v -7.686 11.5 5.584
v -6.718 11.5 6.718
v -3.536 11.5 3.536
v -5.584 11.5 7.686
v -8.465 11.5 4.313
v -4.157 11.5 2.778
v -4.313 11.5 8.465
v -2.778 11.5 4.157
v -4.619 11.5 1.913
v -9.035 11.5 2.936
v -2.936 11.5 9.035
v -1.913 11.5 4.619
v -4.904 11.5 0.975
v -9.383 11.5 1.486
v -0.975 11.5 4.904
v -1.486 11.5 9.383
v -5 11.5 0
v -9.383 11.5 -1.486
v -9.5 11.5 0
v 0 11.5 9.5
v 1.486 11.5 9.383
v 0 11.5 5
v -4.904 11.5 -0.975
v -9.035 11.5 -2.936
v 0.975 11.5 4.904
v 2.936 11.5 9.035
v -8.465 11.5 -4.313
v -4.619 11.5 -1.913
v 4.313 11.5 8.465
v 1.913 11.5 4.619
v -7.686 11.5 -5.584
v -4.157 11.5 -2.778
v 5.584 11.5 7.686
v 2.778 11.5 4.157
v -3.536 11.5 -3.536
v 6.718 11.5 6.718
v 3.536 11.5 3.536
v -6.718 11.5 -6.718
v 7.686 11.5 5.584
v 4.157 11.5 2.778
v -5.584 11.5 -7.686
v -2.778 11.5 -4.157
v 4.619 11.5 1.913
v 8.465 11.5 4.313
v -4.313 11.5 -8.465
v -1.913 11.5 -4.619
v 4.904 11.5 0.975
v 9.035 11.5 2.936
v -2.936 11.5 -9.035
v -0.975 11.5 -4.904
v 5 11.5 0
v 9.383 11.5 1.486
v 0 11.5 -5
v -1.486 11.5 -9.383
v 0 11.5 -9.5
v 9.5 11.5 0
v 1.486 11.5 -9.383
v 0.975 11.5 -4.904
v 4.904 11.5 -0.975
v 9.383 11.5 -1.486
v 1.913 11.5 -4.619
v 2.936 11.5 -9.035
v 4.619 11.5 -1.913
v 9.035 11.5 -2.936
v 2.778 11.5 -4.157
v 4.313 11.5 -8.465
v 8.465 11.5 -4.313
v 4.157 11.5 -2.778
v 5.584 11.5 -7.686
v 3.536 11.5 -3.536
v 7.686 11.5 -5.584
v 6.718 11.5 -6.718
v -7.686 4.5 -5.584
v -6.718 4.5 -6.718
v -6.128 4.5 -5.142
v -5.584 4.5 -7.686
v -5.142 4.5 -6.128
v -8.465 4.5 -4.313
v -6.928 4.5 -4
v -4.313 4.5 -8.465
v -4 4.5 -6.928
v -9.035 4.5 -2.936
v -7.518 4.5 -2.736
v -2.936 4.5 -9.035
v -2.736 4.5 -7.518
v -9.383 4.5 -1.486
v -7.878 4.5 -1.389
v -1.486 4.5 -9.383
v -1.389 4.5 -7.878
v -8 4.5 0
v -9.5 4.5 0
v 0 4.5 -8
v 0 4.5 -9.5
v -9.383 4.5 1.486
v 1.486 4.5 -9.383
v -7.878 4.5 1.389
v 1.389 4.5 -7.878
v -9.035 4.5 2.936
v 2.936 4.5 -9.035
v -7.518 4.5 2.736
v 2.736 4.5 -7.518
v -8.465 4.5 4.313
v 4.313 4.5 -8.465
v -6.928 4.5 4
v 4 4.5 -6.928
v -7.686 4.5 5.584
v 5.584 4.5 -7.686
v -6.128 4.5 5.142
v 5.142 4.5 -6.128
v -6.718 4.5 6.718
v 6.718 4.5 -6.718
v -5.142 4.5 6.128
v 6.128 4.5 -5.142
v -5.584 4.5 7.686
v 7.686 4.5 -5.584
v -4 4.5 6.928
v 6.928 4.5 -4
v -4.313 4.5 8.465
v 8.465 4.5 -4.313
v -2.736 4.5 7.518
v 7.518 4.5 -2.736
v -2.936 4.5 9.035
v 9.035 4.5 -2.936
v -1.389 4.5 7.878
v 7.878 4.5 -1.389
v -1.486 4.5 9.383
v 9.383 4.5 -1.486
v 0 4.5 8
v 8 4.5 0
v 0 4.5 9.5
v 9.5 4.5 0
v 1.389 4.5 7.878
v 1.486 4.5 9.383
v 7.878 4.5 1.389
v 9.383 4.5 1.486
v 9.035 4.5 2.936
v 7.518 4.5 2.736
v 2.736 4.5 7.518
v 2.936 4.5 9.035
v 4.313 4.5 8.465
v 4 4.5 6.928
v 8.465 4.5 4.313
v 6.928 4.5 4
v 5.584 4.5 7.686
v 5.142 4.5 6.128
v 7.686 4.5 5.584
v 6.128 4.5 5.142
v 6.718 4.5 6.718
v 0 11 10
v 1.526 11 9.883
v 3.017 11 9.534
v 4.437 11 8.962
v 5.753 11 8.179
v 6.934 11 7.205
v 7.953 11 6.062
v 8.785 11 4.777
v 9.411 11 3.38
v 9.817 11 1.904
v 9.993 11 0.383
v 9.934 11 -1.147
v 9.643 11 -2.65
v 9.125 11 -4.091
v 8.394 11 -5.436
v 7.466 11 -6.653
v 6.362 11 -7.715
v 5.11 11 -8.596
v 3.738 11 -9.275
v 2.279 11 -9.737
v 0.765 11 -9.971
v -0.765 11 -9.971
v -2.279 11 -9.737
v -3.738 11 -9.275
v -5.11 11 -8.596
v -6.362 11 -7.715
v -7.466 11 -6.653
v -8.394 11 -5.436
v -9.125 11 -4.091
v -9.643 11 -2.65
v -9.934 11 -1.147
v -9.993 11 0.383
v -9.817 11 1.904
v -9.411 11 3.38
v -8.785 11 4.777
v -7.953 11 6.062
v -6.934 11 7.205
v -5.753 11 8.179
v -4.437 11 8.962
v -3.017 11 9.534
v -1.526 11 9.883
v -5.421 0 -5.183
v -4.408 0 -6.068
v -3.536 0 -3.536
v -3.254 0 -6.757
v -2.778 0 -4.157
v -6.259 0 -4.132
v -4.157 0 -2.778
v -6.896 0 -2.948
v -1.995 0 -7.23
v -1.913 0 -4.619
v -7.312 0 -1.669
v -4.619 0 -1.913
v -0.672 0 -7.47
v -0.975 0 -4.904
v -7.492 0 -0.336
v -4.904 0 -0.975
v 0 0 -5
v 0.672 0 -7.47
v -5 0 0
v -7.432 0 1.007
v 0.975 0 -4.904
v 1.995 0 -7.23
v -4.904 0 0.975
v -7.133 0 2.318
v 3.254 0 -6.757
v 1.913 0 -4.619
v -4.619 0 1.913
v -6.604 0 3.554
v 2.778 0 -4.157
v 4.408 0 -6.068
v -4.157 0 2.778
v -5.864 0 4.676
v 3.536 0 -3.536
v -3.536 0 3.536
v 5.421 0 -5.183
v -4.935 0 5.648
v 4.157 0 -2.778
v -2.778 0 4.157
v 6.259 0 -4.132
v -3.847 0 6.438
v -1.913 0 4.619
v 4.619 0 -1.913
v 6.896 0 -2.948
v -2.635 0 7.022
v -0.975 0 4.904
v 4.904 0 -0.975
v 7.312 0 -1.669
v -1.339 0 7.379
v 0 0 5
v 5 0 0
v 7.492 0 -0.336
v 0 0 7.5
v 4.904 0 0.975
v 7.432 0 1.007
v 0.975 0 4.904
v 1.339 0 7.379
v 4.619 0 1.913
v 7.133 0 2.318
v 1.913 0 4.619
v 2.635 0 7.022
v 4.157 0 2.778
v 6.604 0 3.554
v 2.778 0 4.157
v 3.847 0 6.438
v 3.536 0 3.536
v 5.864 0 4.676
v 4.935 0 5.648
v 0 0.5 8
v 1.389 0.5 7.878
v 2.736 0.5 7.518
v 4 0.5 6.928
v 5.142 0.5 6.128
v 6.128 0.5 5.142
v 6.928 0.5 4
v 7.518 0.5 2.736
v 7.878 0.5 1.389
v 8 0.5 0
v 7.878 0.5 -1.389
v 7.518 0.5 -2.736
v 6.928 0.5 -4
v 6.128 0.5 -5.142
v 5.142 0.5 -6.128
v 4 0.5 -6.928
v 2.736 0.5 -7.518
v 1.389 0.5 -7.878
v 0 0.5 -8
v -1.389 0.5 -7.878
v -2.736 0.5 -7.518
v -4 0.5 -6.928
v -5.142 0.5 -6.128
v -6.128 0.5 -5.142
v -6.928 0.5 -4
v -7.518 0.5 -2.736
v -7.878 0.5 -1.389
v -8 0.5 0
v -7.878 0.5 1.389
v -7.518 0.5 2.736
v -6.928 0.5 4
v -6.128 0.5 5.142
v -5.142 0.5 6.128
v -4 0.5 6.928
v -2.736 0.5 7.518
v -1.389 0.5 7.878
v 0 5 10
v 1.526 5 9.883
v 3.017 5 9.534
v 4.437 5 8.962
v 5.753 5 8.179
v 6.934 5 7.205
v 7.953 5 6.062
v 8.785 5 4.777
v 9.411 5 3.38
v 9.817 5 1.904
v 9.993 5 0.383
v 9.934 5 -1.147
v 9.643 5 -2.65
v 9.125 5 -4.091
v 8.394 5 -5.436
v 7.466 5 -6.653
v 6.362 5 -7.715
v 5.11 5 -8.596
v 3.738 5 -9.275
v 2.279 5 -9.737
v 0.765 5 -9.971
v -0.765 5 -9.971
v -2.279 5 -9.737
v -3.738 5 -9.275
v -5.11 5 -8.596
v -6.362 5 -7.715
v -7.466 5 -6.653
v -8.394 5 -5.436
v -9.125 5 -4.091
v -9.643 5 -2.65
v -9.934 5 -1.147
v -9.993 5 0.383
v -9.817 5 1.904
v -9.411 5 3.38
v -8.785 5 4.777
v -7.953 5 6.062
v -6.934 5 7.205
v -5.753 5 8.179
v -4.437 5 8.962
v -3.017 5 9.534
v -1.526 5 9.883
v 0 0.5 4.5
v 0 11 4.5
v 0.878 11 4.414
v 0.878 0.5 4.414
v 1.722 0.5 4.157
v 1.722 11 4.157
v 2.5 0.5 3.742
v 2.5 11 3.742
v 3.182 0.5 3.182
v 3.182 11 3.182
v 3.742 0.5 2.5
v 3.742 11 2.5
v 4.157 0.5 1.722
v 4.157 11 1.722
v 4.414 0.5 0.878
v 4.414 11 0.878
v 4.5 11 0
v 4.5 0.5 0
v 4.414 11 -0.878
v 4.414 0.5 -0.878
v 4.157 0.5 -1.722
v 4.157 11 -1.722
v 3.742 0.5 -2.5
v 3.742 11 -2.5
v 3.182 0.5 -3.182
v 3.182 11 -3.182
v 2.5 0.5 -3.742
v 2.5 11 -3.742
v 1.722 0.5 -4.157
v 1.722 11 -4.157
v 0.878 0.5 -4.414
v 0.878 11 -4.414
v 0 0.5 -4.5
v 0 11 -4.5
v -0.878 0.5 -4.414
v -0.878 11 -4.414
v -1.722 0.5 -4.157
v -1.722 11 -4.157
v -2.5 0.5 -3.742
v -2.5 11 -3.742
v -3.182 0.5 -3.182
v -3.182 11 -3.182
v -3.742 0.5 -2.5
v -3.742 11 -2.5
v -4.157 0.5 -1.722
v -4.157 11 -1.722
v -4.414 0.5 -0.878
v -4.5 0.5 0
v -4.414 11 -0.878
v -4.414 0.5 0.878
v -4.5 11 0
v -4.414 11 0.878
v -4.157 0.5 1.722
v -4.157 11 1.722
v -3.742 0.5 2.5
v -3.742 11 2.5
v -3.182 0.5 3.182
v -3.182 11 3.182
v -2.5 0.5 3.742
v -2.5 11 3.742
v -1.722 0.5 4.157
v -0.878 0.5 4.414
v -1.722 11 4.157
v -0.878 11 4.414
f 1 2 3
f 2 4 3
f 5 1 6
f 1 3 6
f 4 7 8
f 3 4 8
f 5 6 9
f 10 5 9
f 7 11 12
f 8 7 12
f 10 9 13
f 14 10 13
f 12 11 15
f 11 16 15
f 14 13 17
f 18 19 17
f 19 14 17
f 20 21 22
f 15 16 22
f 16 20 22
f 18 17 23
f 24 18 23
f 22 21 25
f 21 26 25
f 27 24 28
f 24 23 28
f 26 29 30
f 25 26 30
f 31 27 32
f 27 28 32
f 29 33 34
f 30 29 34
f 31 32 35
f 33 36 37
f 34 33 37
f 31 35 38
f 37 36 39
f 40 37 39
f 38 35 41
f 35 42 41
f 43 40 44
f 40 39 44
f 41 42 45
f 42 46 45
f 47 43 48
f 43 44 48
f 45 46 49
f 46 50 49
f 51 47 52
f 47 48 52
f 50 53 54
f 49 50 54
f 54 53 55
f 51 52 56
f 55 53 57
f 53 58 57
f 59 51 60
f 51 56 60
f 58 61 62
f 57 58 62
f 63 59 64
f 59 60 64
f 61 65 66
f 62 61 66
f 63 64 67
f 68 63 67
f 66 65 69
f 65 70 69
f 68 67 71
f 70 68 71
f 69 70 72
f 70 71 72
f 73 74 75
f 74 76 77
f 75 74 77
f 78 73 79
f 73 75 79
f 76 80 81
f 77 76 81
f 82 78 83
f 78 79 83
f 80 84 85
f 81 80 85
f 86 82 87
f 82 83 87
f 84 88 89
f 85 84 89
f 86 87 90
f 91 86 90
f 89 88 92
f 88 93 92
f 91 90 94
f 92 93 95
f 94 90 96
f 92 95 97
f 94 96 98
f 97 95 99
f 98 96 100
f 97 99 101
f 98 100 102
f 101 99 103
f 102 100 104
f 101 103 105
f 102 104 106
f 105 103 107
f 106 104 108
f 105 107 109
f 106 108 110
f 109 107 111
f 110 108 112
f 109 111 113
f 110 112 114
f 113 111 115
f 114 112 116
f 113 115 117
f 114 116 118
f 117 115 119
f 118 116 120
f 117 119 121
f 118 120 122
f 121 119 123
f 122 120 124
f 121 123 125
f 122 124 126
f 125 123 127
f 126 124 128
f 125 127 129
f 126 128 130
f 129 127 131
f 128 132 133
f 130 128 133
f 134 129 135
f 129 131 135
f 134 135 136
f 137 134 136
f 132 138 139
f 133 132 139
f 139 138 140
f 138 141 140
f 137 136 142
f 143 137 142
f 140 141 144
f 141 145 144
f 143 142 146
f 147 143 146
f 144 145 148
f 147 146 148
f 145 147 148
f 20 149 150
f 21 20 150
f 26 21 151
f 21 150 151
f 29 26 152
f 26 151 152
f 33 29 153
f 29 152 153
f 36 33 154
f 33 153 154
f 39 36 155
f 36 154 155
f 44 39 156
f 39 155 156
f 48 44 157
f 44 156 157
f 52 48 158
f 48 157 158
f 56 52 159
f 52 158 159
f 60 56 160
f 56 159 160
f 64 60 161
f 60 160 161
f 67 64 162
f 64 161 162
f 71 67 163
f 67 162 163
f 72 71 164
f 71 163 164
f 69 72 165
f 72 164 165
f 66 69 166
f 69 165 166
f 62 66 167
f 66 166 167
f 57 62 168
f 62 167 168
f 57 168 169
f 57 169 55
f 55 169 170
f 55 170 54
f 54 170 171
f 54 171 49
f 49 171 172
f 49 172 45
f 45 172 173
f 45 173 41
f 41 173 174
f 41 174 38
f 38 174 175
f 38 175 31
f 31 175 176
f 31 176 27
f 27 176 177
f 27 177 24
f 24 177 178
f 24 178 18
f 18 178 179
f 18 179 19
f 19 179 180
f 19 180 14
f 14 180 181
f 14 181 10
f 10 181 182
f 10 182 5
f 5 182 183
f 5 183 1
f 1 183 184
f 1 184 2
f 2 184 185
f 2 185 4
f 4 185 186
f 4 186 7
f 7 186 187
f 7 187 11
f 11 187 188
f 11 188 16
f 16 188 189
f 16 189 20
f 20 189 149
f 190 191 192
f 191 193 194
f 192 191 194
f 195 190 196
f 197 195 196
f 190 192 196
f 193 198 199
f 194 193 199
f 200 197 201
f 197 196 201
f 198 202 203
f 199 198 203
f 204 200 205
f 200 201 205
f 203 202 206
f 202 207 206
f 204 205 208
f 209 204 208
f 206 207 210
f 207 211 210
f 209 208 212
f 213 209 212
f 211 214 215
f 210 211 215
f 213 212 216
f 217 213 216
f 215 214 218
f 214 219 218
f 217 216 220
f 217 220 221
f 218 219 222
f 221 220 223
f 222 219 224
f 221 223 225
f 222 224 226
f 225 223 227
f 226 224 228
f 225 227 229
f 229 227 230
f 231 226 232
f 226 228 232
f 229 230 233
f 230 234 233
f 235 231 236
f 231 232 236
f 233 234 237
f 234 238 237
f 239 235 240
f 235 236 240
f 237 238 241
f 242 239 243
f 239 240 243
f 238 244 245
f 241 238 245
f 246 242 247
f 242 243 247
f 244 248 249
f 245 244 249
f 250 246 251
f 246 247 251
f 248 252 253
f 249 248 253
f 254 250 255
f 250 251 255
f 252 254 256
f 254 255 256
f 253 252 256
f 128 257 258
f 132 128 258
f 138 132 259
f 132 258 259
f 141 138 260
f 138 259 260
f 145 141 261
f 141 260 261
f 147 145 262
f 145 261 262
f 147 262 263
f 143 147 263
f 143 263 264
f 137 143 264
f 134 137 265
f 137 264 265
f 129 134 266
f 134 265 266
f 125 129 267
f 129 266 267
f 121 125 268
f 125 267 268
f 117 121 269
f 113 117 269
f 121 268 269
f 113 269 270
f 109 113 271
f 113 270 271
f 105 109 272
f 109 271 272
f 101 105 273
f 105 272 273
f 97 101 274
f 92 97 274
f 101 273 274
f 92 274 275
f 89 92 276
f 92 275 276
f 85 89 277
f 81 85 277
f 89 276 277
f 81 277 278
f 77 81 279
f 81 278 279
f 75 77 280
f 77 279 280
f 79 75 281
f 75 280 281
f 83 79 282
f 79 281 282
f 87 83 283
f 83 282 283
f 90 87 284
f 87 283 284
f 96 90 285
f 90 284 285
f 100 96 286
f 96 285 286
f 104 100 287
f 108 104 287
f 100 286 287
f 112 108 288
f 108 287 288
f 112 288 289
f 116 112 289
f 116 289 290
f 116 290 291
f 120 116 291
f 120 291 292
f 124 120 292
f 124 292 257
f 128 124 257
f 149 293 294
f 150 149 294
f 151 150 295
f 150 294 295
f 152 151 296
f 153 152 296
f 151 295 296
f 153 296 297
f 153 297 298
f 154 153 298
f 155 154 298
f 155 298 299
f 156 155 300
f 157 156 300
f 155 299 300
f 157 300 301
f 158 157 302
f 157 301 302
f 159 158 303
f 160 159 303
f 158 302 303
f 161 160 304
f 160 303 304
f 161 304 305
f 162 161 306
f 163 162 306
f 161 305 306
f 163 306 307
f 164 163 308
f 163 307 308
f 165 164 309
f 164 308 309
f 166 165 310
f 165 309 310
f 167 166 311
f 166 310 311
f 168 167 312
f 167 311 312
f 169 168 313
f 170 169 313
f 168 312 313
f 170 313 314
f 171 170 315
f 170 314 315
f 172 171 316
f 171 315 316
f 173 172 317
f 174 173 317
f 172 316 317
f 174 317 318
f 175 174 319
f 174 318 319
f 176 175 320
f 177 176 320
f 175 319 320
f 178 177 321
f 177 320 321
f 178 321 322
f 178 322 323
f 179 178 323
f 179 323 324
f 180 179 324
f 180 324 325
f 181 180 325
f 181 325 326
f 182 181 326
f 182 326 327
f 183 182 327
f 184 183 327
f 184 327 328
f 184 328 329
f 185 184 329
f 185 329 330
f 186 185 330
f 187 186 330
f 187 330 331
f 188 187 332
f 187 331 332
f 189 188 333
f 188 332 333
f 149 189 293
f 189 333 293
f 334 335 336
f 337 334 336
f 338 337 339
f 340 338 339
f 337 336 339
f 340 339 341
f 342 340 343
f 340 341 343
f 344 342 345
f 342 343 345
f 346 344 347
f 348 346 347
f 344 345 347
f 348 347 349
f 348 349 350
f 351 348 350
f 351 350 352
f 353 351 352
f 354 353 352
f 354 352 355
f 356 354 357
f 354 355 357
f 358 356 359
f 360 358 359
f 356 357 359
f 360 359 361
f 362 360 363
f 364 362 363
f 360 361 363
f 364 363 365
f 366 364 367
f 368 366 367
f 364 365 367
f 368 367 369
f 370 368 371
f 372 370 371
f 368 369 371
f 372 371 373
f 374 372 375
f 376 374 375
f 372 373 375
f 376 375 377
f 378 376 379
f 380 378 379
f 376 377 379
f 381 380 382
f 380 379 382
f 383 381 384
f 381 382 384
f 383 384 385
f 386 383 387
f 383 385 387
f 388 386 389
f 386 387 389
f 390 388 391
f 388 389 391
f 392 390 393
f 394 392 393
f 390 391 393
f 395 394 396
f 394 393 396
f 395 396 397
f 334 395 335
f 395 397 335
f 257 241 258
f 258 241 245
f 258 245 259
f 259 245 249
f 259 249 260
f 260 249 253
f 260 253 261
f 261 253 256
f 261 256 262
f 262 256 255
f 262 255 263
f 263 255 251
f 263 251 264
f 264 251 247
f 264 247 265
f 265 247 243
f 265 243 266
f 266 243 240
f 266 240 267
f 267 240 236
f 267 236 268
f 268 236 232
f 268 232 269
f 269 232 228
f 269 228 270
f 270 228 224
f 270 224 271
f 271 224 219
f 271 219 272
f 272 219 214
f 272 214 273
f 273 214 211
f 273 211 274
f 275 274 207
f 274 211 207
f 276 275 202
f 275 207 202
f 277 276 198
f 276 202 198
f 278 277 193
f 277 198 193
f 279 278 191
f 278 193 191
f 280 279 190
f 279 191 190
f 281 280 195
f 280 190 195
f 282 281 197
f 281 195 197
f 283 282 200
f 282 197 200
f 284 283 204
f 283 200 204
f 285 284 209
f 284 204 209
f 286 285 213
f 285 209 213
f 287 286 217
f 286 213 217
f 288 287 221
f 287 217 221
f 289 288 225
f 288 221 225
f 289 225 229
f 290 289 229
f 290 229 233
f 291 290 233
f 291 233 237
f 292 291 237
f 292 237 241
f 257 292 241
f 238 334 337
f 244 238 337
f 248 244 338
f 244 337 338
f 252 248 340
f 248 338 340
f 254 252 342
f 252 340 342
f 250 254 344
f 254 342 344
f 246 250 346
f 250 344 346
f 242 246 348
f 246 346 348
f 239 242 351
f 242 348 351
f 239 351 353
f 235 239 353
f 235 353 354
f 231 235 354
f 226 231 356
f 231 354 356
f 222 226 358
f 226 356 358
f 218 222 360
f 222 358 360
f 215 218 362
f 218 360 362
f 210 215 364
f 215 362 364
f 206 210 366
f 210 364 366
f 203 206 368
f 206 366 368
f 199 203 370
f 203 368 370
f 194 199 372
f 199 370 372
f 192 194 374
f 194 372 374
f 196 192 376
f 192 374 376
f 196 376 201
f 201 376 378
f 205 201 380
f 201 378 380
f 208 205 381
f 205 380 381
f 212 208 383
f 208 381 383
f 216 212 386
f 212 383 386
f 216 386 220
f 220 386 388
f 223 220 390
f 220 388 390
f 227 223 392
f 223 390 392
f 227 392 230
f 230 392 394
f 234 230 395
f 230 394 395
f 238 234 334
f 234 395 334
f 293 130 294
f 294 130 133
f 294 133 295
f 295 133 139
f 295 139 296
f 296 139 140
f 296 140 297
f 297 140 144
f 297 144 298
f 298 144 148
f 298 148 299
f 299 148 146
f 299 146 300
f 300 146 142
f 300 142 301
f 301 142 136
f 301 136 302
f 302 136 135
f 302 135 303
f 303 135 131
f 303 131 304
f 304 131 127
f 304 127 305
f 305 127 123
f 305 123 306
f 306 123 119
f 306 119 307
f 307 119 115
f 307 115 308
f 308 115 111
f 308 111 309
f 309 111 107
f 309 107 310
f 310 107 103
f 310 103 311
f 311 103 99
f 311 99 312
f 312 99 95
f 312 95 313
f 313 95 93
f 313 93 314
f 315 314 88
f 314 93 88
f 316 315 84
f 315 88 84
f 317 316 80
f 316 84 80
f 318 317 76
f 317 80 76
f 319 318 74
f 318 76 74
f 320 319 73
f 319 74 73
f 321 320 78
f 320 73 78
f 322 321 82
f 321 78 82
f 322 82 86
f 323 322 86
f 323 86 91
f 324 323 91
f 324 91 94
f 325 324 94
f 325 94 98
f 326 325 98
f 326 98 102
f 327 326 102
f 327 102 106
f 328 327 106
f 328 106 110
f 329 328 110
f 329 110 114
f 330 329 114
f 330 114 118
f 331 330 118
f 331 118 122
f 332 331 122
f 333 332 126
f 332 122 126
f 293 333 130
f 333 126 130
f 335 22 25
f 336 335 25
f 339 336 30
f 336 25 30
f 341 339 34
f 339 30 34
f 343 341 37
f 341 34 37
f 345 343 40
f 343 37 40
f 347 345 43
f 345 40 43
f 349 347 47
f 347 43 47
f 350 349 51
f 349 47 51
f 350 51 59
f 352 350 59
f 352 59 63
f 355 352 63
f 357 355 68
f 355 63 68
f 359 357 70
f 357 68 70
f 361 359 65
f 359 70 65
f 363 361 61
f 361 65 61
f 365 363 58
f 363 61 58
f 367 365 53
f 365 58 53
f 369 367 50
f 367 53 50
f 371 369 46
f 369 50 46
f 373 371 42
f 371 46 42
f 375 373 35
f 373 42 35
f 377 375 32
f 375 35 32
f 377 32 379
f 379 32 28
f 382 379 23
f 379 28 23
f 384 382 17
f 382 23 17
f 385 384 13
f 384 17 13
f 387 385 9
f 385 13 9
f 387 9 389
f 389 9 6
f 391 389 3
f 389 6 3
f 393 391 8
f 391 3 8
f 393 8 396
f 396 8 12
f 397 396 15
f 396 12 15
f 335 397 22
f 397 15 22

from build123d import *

# Parameters (mm, degrees)
F2_SIZE = 0.5


with BuildPart() as f1:
    # F0 (on Right) → F1 (revolve)
    with BuildSketch(Plane.YZ):
        Polygon((4.5, 8), (0, 8), (0, 4.5), (11.5, 4.5), (11.5, 10), (4.5, 10), align=None)
    revolve(axis=Axis((0, 13.707888, 0), (0, 1, 0)))

    # F2
    f2_edges = [f1.edges().sort_by_distance(p)[0] for p in [
        (0, 11.5, -4.5),
        (0, 0, -4.5),
        (0, 4.5, -10),
        (0, 11.5, -10),
        (0, 0, -8),
    ]]
    chamfer(f2_edges, length=F2_SIZE)


solid = f1.part
